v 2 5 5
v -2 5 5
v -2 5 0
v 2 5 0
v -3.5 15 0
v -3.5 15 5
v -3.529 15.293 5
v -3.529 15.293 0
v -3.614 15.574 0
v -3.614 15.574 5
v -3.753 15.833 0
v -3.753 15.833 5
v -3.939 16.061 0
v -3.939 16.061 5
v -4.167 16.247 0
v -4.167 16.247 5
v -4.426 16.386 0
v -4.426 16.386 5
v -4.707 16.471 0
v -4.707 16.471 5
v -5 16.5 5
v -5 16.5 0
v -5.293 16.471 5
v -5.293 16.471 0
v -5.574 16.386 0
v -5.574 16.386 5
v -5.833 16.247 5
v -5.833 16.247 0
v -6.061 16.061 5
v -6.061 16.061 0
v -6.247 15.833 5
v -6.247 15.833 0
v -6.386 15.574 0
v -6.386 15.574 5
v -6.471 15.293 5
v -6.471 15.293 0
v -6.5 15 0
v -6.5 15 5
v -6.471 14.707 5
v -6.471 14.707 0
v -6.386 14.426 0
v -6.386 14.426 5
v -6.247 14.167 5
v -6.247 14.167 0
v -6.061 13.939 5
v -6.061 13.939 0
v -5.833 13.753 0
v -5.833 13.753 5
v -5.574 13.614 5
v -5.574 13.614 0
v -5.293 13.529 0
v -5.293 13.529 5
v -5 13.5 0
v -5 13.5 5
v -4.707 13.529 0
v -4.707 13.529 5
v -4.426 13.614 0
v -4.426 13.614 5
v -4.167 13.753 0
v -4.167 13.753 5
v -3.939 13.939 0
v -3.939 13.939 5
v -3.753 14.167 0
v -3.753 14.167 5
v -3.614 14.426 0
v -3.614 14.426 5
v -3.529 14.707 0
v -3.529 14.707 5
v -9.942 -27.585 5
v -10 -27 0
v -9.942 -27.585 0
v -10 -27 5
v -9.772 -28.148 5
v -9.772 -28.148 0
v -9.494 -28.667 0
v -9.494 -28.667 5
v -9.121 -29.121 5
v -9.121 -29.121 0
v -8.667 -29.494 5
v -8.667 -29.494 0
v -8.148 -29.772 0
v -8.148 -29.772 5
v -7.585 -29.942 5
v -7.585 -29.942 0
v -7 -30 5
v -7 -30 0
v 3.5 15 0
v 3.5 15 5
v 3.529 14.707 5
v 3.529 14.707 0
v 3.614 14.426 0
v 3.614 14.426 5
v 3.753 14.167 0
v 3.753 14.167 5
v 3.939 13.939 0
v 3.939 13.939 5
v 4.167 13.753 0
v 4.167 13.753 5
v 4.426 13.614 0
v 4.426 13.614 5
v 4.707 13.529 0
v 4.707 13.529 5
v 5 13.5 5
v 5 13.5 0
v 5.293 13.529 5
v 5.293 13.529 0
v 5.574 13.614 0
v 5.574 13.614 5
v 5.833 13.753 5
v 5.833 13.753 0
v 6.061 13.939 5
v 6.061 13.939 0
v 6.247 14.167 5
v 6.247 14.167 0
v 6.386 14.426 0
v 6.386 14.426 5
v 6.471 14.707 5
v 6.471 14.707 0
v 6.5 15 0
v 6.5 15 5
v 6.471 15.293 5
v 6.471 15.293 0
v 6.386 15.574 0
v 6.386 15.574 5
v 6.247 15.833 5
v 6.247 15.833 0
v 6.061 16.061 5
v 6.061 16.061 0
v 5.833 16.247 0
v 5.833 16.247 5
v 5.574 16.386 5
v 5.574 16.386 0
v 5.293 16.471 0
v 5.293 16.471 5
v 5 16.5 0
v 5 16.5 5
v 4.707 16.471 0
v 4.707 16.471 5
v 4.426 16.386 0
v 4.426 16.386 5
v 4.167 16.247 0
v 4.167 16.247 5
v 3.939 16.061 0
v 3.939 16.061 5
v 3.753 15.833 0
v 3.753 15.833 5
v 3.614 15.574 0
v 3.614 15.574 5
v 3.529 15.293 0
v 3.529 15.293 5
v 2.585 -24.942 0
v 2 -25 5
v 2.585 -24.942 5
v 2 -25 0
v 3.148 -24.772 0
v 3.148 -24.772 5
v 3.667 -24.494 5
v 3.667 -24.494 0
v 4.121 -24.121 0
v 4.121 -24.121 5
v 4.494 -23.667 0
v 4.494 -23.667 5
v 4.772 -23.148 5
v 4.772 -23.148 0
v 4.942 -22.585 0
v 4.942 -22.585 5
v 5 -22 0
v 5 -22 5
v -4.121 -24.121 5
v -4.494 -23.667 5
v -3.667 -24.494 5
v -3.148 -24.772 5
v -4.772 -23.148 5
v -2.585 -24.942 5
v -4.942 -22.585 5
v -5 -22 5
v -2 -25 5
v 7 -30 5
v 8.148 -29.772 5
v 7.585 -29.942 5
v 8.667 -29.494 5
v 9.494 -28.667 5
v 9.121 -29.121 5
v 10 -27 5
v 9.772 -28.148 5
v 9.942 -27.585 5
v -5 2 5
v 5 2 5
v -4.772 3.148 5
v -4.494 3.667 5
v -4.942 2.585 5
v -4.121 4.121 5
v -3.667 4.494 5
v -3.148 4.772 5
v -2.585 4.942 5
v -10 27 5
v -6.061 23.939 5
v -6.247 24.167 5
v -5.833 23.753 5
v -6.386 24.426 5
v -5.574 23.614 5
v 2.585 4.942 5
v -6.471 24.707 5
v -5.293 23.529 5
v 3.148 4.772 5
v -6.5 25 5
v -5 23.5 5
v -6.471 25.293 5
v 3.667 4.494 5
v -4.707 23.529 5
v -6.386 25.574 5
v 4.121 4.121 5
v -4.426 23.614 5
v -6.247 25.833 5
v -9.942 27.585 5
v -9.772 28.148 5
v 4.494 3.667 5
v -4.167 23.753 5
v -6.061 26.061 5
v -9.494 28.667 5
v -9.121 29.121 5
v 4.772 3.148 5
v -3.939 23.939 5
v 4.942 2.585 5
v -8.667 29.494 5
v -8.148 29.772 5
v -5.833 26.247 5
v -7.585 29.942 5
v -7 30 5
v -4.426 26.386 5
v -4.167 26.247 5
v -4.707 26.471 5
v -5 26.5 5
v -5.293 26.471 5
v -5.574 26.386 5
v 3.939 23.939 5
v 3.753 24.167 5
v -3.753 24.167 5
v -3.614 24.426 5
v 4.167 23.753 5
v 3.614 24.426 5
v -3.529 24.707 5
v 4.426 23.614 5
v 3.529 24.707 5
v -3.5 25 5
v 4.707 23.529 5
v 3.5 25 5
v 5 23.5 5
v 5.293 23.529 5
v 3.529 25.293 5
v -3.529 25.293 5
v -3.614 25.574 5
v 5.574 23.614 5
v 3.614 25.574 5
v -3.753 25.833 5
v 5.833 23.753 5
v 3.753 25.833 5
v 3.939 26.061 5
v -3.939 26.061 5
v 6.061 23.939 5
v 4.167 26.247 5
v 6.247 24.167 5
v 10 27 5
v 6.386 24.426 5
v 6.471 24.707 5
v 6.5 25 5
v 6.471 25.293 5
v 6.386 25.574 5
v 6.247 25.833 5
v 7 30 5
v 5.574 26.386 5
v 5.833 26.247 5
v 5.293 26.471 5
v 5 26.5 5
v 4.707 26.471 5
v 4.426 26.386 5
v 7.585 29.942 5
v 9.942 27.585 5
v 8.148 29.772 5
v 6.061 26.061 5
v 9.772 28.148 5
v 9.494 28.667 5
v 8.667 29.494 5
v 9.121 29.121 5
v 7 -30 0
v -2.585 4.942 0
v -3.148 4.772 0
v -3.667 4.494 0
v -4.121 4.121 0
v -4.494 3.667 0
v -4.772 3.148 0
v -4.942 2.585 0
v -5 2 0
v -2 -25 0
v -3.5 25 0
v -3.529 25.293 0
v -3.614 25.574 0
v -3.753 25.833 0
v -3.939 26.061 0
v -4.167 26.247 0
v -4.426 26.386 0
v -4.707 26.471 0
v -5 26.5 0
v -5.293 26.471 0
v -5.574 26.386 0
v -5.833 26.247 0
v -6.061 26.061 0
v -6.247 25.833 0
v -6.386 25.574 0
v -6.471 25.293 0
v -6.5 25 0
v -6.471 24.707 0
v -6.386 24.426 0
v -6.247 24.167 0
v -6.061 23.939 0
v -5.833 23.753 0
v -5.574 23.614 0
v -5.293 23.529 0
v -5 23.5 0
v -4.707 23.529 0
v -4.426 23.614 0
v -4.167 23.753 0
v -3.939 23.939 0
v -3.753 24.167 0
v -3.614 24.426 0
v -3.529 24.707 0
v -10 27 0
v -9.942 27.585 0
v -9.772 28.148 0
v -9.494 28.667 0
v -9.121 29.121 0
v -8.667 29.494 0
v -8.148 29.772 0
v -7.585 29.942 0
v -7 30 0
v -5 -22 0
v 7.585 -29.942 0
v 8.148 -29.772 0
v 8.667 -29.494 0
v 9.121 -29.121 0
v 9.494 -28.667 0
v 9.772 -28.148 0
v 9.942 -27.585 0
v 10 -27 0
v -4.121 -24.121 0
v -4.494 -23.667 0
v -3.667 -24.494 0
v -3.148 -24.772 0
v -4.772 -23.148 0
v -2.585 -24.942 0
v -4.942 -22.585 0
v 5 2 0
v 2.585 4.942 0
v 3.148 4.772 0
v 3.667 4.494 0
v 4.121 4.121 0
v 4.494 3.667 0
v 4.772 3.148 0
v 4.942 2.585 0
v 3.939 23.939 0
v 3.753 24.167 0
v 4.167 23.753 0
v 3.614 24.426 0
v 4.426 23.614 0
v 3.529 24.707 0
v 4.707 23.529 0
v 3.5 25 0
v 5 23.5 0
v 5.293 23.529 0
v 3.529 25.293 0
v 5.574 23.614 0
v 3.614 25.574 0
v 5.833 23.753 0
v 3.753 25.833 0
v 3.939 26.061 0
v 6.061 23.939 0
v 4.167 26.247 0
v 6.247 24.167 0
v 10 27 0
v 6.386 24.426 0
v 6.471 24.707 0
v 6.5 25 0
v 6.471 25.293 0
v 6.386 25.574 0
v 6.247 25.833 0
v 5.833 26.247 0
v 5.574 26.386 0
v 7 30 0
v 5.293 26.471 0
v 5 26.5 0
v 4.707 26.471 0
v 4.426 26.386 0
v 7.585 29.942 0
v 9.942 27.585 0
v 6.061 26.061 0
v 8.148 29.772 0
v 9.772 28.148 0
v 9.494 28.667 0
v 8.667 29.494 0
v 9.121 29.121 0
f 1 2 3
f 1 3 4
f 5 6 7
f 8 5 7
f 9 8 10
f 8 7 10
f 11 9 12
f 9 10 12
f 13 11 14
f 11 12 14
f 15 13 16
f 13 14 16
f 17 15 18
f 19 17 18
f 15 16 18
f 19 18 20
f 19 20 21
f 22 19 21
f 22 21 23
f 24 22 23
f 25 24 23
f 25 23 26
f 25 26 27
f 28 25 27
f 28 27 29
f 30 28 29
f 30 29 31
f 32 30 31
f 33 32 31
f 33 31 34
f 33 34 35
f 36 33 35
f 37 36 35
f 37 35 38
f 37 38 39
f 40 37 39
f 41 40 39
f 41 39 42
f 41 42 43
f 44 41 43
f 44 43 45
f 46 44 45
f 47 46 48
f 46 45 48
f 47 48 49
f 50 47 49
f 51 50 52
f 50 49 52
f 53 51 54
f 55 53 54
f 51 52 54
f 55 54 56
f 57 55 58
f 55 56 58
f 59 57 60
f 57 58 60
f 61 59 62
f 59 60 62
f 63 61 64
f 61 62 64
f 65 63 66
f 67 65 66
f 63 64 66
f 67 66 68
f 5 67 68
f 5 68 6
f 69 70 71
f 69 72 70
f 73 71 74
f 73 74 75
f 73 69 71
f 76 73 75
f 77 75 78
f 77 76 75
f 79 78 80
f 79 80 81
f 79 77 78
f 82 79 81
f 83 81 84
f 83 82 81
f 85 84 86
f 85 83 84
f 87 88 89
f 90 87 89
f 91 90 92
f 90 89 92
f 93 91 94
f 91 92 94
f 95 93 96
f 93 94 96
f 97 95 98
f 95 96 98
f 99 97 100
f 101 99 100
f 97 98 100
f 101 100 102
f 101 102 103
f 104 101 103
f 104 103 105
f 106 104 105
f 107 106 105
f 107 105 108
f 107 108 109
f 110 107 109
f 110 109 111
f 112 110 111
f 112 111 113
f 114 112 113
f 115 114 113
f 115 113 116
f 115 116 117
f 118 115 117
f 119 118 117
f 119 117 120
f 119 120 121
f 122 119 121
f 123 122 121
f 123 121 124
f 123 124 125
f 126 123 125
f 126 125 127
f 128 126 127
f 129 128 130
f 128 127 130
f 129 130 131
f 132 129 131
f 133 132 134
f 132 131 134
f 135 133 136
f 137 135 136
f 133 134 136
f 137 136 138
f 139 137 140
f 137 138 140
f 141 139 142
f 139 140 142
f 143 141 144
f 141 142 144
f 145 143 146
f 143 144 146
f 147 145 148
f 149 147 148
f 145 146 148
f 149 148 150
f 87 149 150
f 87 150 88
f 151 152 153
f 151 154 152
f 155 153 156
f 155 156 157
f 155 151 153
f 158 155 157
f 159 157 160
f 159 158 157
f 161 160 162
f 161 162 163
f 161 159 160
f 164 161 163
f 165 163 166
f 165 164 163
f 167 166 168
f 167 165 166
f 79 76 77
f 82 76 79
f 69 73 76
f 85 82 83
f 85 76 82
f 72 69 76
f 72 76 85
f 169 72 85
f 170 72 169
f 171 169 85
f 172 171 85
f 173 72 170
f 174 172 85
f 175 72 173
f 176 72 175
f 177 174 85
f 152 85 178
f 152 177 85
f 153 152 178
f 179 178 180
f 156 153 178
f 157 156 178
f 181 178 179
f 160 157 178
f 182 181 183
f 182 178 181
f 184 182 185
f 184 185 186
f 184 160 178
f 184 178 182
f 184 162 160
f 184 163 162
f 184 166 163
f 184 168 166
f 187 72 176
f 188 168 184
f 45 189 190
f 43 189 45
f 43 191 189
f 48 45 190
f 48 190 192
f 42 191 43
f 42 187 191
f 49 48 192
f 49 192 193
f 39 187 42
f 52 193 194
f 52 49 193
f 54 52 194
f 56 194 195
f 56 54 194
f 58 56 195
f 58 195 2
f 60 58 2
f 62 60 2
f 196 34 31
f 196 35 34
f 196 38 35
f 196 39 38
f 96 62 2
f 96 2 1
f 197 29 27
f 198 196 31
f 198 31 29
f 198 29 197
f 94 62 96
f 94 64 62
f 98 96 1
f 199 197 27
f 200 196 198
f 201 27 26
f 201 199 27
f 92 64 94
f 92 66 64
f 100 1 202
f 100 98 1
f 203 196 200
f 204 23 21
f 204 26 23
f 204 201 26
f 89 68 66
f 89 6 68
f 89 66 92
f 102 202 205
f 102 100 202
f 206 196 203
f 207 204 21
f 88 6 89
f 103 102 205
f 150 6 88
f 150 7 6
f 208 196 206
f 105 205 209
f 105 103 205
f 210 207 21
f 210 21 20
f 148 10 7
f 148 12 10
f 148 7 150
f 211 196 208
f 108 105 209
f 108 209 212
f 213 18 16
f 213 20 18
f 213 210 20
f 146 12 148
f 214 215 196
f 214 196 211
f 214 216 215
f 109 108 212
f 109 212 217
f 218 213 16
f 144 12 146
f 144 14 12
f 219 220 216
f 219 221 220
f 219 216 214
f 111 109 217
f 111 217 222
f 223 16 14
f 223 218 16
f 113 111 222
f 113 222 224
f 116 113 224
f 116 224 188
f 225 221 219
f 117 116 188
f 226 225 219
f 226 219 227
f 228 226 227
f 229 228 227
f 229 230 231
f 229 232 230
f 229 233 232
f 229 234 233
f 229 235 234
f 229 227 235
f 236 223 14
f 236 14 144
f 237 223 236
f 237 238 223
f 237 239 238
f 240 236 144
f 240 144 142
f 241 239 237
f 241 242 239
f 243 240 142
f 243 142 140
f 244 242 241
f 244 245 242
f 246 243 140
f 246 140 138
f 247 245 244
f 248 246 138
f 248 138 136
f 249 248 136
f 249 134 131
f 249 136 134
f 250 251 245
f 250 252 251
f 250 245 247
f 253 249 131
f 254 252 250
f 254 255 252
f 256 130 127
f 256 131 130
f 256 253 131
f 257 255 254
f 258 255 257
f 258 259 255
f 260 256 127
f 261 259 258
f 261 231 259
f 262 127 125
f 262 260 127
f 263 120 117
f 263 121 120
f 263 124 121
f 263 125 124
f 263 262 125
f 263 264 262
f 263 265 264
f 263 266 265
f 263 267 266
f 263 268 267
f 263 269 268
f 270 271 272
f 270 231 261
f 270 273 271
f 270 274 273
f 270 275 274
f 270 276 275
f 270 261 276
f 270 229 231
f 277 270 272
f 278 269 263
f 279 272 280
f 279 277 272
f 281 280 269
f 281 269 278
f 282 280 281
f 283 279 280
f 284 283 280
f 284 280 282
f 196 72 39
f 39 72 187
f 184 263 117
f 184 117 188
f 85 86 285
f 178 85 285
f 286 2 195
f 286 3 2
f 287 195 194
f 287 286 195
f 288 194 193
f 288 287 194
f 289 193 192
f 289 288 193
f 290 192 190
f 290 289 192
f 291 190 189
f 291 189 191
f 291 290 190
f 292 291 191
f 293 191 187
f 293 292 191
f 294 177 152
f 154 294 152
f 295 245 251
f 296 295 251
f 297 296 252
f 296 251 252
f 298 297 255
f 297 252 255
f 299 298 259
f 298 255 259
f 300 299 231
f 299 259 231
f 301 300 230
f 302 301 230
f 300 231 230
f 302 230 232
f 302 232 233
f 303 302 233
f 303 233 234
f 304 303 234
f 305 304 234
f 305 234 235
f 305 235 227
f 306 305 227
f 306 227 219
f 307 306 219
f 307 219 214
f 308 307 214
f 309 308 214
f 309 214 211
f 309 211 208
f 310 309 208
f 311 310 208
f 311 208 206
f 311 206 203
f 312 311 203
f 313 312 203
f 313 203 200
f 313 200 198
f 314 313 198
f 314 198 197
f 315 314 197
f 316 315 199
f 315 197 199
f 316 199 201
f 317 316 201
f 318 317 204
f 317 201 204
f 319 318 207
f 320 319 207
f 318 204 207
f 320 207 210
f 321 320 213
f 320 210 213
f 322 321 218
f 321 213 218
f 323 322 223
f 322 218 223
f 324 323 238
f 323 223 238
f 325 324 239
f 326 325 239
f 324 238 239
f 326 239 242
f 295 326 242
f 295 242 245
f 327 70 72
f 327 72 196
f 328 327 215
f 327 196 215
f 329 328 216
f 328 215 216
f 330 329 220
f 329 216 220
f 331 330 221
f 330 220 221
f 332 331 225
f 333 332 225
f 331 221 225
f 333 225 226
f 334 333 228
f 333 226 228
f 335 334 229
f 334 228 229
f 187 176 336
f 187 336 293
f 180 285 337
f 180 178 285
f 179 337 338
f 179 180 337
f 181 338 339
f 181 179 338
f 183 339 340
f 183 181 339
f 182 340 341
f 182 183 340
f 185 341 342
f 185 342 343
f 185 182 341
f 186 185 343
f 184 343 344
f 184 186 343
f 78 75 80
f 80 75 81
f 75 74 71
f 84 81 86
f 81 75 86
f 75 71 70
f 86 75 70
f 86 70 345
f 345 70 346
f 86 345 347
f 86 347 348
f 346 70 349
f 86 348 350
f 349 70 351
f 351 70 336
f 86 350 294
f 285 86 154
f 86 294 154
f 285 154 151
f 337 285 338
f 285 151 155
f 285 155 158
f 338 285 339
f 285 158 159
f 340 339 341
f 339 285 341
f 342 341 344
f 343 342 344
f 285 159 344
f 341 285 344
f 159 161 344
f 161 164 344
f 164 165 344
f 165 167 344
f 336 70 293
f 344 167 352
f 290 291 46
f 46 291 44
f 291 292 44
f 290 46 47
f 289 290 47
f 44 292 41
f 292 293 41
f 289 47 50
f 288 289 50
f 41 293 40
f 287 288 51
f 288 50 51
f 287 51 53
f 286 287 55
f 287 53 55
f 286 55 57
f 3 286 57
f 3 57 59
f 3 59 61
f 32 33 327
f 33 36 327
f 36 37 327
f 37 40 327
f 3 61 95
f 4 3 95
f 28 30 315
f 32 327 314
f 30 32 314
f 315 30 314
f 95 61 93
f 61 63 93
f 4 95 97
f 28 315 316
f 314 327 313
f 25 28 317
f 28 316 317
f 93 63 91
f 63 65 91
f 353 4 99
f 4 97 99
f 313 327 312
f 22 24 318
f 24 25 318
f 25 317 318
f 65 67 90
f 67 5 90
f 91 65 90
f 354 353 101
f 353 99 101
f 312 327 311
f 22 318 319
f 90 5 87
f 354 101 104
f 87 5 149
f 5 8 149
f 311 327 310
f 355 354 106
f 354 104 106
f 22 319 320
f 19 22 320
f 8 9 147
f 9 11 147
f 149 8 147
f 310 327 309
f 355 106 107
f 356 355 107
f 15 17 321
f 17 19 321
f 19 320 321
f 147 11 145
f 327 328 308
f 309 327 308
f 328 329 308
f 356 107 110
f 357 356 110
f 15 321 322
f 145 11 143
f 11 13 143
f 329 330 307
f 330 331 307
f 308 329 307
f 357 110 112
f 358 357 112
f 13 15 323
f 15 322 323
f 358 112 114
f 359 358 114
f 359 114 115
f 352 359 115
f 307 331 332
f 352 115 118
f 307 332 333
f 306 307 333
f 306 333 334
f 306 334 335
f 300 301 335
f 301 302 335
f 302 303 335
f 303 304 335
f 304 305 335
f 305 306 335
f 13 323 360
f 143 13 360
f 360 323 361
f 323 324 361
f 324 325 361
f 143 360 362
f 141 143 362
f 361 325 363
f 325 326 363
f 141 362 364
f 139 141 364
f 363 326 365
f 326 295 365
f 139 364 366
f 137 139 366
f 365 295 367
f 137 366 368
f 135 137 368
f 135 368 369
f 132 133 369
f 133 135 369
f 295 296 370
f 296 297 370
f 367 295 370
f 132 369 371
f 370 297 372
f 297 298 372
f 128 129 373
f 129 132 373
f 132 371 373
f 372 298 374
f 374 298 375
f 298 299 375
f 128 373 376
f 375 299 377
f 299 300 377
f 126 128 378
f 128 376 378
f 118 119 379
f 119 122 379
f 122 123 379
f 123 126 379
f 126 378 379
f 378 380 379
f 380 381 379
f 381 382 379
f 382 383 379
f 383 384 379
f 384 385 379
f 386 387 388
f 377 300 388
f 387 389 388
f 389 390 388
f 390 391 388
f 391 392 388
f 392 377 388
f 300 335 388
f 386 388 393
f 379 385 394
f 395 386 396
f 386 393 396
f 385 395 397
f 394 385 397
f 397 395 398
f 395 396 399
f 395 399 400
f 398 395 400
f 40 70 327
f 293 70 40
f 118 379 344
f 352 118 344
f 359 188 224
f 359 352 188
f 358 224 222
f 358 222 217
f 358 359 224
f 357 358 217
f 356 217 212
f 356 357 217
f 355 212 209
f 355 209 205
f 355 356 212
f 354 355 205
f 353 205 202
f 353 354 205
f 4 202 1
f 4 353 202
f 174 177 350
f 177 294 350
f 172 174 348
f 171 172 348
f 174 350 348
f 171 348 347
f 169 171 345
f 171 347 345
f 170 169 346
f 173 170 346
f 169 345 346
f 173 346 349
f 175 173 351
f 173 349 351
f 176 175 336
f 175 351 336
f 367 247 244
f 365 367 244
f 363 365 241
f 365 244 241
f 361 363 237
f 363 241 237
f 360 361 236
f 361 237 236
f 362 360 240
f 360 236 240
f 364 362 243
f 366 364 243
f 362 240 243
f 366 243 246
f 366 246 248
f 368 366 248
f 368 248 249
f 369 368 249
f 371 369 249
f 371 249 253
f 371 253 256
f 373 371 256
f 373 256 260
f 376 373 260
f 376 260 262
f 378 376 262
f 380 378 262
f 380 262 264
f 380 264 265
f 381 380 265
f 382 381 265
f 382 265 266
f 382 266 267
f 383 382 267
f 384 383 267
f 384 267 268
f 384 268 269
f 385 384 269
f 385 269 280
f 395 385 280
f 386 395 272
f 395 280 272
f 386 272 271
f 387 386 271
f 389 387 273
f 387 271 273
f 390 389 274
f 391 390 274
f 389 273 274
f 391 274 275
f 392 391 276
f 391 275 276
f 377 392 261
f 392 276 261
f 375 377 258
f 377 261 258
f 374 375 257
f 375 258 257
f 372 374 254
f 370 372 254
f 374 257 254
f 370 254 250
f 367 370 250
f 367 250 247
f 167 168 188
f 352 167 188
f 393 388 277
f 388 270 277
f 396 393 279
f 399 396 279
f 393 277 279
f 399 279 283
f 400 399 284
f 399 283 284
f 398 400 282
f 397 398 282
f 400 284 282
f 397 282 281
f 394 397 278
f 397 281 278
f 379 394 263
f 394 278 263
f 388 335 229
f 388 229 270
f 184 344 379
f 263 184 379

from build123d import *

# Parameters (mm, degrees)
SKETCH_1_W          = 20
SKETCH_1_H          = 60
EXTRUDE_1_DEPTH     = 5
SKETCH_2_R          = 1.5
CUT_EXTRUDE_1_DEPTH = 33.015621187
SKETCH_3_W          = 10
SKETCH_3_H          = 30
CUT_EXTRUDE_2_DEPTH = 33.015621187
FILLET_1_R          = 3


with BuildPart() as part:
    # 草图1 → 凸台-拉伸1 (new body)
    with BuildSketch(Plane.XY):
        Rectangle(SKETCH_1_W, SKETCH_1_H)
    extrude(amount=EXTRUDE_1_DEPTH)

    # 草图2 → 切除-拉伸1 (cut, through all)
    with BuildSketch(Plane.XY.offset(5)):
        with Locations((-5, 25)):
            Circle(SKETCH_2_R)
        with Locations((-5, 15)):
            Circle(SKETCH_2_R)
        with Locations(Location((5, 15, 0), (0, 0, 180))):
            Circle(SKETCH_2_R)
        with Locations(Location((5, 25, 0), (0, 0, 180))):
            Circle(SKETCH_2_R)
    extrude(amount=-CUT_EXTRUDE_1_DEPTH, mode=Mode.SUBTRACT)

    # 草图3 → 切除-拉伸2 (cut, through all)
    with BuildSketch(Plane.XY.offset(5)):
        with Locations((0, -10)):
            Rectangle(SKETCH_3_W, SKETCH_3_H)
    extrude(amount=-CUT_EXTRUDE_2_DEPTH, mode=Mode.SUBTRACT)

    # 圆角1
    fillet_1_edges = [part.edges().sort_by_distance(p)[0] for p in [
        (5, 5, 2.5),
        (5, -25, 2.5),
        (-5, -25, 2.5),
        (-5, 5, 2.5),
        (10, -30, 2.5),
        (-10, -30, 2.5),
        (-10, 30, 2.5),
        (10, 30, 2.5),
    ]]
    fillet(fillet_1_edges, radius=FILLET_1_R)


solid = part.part
